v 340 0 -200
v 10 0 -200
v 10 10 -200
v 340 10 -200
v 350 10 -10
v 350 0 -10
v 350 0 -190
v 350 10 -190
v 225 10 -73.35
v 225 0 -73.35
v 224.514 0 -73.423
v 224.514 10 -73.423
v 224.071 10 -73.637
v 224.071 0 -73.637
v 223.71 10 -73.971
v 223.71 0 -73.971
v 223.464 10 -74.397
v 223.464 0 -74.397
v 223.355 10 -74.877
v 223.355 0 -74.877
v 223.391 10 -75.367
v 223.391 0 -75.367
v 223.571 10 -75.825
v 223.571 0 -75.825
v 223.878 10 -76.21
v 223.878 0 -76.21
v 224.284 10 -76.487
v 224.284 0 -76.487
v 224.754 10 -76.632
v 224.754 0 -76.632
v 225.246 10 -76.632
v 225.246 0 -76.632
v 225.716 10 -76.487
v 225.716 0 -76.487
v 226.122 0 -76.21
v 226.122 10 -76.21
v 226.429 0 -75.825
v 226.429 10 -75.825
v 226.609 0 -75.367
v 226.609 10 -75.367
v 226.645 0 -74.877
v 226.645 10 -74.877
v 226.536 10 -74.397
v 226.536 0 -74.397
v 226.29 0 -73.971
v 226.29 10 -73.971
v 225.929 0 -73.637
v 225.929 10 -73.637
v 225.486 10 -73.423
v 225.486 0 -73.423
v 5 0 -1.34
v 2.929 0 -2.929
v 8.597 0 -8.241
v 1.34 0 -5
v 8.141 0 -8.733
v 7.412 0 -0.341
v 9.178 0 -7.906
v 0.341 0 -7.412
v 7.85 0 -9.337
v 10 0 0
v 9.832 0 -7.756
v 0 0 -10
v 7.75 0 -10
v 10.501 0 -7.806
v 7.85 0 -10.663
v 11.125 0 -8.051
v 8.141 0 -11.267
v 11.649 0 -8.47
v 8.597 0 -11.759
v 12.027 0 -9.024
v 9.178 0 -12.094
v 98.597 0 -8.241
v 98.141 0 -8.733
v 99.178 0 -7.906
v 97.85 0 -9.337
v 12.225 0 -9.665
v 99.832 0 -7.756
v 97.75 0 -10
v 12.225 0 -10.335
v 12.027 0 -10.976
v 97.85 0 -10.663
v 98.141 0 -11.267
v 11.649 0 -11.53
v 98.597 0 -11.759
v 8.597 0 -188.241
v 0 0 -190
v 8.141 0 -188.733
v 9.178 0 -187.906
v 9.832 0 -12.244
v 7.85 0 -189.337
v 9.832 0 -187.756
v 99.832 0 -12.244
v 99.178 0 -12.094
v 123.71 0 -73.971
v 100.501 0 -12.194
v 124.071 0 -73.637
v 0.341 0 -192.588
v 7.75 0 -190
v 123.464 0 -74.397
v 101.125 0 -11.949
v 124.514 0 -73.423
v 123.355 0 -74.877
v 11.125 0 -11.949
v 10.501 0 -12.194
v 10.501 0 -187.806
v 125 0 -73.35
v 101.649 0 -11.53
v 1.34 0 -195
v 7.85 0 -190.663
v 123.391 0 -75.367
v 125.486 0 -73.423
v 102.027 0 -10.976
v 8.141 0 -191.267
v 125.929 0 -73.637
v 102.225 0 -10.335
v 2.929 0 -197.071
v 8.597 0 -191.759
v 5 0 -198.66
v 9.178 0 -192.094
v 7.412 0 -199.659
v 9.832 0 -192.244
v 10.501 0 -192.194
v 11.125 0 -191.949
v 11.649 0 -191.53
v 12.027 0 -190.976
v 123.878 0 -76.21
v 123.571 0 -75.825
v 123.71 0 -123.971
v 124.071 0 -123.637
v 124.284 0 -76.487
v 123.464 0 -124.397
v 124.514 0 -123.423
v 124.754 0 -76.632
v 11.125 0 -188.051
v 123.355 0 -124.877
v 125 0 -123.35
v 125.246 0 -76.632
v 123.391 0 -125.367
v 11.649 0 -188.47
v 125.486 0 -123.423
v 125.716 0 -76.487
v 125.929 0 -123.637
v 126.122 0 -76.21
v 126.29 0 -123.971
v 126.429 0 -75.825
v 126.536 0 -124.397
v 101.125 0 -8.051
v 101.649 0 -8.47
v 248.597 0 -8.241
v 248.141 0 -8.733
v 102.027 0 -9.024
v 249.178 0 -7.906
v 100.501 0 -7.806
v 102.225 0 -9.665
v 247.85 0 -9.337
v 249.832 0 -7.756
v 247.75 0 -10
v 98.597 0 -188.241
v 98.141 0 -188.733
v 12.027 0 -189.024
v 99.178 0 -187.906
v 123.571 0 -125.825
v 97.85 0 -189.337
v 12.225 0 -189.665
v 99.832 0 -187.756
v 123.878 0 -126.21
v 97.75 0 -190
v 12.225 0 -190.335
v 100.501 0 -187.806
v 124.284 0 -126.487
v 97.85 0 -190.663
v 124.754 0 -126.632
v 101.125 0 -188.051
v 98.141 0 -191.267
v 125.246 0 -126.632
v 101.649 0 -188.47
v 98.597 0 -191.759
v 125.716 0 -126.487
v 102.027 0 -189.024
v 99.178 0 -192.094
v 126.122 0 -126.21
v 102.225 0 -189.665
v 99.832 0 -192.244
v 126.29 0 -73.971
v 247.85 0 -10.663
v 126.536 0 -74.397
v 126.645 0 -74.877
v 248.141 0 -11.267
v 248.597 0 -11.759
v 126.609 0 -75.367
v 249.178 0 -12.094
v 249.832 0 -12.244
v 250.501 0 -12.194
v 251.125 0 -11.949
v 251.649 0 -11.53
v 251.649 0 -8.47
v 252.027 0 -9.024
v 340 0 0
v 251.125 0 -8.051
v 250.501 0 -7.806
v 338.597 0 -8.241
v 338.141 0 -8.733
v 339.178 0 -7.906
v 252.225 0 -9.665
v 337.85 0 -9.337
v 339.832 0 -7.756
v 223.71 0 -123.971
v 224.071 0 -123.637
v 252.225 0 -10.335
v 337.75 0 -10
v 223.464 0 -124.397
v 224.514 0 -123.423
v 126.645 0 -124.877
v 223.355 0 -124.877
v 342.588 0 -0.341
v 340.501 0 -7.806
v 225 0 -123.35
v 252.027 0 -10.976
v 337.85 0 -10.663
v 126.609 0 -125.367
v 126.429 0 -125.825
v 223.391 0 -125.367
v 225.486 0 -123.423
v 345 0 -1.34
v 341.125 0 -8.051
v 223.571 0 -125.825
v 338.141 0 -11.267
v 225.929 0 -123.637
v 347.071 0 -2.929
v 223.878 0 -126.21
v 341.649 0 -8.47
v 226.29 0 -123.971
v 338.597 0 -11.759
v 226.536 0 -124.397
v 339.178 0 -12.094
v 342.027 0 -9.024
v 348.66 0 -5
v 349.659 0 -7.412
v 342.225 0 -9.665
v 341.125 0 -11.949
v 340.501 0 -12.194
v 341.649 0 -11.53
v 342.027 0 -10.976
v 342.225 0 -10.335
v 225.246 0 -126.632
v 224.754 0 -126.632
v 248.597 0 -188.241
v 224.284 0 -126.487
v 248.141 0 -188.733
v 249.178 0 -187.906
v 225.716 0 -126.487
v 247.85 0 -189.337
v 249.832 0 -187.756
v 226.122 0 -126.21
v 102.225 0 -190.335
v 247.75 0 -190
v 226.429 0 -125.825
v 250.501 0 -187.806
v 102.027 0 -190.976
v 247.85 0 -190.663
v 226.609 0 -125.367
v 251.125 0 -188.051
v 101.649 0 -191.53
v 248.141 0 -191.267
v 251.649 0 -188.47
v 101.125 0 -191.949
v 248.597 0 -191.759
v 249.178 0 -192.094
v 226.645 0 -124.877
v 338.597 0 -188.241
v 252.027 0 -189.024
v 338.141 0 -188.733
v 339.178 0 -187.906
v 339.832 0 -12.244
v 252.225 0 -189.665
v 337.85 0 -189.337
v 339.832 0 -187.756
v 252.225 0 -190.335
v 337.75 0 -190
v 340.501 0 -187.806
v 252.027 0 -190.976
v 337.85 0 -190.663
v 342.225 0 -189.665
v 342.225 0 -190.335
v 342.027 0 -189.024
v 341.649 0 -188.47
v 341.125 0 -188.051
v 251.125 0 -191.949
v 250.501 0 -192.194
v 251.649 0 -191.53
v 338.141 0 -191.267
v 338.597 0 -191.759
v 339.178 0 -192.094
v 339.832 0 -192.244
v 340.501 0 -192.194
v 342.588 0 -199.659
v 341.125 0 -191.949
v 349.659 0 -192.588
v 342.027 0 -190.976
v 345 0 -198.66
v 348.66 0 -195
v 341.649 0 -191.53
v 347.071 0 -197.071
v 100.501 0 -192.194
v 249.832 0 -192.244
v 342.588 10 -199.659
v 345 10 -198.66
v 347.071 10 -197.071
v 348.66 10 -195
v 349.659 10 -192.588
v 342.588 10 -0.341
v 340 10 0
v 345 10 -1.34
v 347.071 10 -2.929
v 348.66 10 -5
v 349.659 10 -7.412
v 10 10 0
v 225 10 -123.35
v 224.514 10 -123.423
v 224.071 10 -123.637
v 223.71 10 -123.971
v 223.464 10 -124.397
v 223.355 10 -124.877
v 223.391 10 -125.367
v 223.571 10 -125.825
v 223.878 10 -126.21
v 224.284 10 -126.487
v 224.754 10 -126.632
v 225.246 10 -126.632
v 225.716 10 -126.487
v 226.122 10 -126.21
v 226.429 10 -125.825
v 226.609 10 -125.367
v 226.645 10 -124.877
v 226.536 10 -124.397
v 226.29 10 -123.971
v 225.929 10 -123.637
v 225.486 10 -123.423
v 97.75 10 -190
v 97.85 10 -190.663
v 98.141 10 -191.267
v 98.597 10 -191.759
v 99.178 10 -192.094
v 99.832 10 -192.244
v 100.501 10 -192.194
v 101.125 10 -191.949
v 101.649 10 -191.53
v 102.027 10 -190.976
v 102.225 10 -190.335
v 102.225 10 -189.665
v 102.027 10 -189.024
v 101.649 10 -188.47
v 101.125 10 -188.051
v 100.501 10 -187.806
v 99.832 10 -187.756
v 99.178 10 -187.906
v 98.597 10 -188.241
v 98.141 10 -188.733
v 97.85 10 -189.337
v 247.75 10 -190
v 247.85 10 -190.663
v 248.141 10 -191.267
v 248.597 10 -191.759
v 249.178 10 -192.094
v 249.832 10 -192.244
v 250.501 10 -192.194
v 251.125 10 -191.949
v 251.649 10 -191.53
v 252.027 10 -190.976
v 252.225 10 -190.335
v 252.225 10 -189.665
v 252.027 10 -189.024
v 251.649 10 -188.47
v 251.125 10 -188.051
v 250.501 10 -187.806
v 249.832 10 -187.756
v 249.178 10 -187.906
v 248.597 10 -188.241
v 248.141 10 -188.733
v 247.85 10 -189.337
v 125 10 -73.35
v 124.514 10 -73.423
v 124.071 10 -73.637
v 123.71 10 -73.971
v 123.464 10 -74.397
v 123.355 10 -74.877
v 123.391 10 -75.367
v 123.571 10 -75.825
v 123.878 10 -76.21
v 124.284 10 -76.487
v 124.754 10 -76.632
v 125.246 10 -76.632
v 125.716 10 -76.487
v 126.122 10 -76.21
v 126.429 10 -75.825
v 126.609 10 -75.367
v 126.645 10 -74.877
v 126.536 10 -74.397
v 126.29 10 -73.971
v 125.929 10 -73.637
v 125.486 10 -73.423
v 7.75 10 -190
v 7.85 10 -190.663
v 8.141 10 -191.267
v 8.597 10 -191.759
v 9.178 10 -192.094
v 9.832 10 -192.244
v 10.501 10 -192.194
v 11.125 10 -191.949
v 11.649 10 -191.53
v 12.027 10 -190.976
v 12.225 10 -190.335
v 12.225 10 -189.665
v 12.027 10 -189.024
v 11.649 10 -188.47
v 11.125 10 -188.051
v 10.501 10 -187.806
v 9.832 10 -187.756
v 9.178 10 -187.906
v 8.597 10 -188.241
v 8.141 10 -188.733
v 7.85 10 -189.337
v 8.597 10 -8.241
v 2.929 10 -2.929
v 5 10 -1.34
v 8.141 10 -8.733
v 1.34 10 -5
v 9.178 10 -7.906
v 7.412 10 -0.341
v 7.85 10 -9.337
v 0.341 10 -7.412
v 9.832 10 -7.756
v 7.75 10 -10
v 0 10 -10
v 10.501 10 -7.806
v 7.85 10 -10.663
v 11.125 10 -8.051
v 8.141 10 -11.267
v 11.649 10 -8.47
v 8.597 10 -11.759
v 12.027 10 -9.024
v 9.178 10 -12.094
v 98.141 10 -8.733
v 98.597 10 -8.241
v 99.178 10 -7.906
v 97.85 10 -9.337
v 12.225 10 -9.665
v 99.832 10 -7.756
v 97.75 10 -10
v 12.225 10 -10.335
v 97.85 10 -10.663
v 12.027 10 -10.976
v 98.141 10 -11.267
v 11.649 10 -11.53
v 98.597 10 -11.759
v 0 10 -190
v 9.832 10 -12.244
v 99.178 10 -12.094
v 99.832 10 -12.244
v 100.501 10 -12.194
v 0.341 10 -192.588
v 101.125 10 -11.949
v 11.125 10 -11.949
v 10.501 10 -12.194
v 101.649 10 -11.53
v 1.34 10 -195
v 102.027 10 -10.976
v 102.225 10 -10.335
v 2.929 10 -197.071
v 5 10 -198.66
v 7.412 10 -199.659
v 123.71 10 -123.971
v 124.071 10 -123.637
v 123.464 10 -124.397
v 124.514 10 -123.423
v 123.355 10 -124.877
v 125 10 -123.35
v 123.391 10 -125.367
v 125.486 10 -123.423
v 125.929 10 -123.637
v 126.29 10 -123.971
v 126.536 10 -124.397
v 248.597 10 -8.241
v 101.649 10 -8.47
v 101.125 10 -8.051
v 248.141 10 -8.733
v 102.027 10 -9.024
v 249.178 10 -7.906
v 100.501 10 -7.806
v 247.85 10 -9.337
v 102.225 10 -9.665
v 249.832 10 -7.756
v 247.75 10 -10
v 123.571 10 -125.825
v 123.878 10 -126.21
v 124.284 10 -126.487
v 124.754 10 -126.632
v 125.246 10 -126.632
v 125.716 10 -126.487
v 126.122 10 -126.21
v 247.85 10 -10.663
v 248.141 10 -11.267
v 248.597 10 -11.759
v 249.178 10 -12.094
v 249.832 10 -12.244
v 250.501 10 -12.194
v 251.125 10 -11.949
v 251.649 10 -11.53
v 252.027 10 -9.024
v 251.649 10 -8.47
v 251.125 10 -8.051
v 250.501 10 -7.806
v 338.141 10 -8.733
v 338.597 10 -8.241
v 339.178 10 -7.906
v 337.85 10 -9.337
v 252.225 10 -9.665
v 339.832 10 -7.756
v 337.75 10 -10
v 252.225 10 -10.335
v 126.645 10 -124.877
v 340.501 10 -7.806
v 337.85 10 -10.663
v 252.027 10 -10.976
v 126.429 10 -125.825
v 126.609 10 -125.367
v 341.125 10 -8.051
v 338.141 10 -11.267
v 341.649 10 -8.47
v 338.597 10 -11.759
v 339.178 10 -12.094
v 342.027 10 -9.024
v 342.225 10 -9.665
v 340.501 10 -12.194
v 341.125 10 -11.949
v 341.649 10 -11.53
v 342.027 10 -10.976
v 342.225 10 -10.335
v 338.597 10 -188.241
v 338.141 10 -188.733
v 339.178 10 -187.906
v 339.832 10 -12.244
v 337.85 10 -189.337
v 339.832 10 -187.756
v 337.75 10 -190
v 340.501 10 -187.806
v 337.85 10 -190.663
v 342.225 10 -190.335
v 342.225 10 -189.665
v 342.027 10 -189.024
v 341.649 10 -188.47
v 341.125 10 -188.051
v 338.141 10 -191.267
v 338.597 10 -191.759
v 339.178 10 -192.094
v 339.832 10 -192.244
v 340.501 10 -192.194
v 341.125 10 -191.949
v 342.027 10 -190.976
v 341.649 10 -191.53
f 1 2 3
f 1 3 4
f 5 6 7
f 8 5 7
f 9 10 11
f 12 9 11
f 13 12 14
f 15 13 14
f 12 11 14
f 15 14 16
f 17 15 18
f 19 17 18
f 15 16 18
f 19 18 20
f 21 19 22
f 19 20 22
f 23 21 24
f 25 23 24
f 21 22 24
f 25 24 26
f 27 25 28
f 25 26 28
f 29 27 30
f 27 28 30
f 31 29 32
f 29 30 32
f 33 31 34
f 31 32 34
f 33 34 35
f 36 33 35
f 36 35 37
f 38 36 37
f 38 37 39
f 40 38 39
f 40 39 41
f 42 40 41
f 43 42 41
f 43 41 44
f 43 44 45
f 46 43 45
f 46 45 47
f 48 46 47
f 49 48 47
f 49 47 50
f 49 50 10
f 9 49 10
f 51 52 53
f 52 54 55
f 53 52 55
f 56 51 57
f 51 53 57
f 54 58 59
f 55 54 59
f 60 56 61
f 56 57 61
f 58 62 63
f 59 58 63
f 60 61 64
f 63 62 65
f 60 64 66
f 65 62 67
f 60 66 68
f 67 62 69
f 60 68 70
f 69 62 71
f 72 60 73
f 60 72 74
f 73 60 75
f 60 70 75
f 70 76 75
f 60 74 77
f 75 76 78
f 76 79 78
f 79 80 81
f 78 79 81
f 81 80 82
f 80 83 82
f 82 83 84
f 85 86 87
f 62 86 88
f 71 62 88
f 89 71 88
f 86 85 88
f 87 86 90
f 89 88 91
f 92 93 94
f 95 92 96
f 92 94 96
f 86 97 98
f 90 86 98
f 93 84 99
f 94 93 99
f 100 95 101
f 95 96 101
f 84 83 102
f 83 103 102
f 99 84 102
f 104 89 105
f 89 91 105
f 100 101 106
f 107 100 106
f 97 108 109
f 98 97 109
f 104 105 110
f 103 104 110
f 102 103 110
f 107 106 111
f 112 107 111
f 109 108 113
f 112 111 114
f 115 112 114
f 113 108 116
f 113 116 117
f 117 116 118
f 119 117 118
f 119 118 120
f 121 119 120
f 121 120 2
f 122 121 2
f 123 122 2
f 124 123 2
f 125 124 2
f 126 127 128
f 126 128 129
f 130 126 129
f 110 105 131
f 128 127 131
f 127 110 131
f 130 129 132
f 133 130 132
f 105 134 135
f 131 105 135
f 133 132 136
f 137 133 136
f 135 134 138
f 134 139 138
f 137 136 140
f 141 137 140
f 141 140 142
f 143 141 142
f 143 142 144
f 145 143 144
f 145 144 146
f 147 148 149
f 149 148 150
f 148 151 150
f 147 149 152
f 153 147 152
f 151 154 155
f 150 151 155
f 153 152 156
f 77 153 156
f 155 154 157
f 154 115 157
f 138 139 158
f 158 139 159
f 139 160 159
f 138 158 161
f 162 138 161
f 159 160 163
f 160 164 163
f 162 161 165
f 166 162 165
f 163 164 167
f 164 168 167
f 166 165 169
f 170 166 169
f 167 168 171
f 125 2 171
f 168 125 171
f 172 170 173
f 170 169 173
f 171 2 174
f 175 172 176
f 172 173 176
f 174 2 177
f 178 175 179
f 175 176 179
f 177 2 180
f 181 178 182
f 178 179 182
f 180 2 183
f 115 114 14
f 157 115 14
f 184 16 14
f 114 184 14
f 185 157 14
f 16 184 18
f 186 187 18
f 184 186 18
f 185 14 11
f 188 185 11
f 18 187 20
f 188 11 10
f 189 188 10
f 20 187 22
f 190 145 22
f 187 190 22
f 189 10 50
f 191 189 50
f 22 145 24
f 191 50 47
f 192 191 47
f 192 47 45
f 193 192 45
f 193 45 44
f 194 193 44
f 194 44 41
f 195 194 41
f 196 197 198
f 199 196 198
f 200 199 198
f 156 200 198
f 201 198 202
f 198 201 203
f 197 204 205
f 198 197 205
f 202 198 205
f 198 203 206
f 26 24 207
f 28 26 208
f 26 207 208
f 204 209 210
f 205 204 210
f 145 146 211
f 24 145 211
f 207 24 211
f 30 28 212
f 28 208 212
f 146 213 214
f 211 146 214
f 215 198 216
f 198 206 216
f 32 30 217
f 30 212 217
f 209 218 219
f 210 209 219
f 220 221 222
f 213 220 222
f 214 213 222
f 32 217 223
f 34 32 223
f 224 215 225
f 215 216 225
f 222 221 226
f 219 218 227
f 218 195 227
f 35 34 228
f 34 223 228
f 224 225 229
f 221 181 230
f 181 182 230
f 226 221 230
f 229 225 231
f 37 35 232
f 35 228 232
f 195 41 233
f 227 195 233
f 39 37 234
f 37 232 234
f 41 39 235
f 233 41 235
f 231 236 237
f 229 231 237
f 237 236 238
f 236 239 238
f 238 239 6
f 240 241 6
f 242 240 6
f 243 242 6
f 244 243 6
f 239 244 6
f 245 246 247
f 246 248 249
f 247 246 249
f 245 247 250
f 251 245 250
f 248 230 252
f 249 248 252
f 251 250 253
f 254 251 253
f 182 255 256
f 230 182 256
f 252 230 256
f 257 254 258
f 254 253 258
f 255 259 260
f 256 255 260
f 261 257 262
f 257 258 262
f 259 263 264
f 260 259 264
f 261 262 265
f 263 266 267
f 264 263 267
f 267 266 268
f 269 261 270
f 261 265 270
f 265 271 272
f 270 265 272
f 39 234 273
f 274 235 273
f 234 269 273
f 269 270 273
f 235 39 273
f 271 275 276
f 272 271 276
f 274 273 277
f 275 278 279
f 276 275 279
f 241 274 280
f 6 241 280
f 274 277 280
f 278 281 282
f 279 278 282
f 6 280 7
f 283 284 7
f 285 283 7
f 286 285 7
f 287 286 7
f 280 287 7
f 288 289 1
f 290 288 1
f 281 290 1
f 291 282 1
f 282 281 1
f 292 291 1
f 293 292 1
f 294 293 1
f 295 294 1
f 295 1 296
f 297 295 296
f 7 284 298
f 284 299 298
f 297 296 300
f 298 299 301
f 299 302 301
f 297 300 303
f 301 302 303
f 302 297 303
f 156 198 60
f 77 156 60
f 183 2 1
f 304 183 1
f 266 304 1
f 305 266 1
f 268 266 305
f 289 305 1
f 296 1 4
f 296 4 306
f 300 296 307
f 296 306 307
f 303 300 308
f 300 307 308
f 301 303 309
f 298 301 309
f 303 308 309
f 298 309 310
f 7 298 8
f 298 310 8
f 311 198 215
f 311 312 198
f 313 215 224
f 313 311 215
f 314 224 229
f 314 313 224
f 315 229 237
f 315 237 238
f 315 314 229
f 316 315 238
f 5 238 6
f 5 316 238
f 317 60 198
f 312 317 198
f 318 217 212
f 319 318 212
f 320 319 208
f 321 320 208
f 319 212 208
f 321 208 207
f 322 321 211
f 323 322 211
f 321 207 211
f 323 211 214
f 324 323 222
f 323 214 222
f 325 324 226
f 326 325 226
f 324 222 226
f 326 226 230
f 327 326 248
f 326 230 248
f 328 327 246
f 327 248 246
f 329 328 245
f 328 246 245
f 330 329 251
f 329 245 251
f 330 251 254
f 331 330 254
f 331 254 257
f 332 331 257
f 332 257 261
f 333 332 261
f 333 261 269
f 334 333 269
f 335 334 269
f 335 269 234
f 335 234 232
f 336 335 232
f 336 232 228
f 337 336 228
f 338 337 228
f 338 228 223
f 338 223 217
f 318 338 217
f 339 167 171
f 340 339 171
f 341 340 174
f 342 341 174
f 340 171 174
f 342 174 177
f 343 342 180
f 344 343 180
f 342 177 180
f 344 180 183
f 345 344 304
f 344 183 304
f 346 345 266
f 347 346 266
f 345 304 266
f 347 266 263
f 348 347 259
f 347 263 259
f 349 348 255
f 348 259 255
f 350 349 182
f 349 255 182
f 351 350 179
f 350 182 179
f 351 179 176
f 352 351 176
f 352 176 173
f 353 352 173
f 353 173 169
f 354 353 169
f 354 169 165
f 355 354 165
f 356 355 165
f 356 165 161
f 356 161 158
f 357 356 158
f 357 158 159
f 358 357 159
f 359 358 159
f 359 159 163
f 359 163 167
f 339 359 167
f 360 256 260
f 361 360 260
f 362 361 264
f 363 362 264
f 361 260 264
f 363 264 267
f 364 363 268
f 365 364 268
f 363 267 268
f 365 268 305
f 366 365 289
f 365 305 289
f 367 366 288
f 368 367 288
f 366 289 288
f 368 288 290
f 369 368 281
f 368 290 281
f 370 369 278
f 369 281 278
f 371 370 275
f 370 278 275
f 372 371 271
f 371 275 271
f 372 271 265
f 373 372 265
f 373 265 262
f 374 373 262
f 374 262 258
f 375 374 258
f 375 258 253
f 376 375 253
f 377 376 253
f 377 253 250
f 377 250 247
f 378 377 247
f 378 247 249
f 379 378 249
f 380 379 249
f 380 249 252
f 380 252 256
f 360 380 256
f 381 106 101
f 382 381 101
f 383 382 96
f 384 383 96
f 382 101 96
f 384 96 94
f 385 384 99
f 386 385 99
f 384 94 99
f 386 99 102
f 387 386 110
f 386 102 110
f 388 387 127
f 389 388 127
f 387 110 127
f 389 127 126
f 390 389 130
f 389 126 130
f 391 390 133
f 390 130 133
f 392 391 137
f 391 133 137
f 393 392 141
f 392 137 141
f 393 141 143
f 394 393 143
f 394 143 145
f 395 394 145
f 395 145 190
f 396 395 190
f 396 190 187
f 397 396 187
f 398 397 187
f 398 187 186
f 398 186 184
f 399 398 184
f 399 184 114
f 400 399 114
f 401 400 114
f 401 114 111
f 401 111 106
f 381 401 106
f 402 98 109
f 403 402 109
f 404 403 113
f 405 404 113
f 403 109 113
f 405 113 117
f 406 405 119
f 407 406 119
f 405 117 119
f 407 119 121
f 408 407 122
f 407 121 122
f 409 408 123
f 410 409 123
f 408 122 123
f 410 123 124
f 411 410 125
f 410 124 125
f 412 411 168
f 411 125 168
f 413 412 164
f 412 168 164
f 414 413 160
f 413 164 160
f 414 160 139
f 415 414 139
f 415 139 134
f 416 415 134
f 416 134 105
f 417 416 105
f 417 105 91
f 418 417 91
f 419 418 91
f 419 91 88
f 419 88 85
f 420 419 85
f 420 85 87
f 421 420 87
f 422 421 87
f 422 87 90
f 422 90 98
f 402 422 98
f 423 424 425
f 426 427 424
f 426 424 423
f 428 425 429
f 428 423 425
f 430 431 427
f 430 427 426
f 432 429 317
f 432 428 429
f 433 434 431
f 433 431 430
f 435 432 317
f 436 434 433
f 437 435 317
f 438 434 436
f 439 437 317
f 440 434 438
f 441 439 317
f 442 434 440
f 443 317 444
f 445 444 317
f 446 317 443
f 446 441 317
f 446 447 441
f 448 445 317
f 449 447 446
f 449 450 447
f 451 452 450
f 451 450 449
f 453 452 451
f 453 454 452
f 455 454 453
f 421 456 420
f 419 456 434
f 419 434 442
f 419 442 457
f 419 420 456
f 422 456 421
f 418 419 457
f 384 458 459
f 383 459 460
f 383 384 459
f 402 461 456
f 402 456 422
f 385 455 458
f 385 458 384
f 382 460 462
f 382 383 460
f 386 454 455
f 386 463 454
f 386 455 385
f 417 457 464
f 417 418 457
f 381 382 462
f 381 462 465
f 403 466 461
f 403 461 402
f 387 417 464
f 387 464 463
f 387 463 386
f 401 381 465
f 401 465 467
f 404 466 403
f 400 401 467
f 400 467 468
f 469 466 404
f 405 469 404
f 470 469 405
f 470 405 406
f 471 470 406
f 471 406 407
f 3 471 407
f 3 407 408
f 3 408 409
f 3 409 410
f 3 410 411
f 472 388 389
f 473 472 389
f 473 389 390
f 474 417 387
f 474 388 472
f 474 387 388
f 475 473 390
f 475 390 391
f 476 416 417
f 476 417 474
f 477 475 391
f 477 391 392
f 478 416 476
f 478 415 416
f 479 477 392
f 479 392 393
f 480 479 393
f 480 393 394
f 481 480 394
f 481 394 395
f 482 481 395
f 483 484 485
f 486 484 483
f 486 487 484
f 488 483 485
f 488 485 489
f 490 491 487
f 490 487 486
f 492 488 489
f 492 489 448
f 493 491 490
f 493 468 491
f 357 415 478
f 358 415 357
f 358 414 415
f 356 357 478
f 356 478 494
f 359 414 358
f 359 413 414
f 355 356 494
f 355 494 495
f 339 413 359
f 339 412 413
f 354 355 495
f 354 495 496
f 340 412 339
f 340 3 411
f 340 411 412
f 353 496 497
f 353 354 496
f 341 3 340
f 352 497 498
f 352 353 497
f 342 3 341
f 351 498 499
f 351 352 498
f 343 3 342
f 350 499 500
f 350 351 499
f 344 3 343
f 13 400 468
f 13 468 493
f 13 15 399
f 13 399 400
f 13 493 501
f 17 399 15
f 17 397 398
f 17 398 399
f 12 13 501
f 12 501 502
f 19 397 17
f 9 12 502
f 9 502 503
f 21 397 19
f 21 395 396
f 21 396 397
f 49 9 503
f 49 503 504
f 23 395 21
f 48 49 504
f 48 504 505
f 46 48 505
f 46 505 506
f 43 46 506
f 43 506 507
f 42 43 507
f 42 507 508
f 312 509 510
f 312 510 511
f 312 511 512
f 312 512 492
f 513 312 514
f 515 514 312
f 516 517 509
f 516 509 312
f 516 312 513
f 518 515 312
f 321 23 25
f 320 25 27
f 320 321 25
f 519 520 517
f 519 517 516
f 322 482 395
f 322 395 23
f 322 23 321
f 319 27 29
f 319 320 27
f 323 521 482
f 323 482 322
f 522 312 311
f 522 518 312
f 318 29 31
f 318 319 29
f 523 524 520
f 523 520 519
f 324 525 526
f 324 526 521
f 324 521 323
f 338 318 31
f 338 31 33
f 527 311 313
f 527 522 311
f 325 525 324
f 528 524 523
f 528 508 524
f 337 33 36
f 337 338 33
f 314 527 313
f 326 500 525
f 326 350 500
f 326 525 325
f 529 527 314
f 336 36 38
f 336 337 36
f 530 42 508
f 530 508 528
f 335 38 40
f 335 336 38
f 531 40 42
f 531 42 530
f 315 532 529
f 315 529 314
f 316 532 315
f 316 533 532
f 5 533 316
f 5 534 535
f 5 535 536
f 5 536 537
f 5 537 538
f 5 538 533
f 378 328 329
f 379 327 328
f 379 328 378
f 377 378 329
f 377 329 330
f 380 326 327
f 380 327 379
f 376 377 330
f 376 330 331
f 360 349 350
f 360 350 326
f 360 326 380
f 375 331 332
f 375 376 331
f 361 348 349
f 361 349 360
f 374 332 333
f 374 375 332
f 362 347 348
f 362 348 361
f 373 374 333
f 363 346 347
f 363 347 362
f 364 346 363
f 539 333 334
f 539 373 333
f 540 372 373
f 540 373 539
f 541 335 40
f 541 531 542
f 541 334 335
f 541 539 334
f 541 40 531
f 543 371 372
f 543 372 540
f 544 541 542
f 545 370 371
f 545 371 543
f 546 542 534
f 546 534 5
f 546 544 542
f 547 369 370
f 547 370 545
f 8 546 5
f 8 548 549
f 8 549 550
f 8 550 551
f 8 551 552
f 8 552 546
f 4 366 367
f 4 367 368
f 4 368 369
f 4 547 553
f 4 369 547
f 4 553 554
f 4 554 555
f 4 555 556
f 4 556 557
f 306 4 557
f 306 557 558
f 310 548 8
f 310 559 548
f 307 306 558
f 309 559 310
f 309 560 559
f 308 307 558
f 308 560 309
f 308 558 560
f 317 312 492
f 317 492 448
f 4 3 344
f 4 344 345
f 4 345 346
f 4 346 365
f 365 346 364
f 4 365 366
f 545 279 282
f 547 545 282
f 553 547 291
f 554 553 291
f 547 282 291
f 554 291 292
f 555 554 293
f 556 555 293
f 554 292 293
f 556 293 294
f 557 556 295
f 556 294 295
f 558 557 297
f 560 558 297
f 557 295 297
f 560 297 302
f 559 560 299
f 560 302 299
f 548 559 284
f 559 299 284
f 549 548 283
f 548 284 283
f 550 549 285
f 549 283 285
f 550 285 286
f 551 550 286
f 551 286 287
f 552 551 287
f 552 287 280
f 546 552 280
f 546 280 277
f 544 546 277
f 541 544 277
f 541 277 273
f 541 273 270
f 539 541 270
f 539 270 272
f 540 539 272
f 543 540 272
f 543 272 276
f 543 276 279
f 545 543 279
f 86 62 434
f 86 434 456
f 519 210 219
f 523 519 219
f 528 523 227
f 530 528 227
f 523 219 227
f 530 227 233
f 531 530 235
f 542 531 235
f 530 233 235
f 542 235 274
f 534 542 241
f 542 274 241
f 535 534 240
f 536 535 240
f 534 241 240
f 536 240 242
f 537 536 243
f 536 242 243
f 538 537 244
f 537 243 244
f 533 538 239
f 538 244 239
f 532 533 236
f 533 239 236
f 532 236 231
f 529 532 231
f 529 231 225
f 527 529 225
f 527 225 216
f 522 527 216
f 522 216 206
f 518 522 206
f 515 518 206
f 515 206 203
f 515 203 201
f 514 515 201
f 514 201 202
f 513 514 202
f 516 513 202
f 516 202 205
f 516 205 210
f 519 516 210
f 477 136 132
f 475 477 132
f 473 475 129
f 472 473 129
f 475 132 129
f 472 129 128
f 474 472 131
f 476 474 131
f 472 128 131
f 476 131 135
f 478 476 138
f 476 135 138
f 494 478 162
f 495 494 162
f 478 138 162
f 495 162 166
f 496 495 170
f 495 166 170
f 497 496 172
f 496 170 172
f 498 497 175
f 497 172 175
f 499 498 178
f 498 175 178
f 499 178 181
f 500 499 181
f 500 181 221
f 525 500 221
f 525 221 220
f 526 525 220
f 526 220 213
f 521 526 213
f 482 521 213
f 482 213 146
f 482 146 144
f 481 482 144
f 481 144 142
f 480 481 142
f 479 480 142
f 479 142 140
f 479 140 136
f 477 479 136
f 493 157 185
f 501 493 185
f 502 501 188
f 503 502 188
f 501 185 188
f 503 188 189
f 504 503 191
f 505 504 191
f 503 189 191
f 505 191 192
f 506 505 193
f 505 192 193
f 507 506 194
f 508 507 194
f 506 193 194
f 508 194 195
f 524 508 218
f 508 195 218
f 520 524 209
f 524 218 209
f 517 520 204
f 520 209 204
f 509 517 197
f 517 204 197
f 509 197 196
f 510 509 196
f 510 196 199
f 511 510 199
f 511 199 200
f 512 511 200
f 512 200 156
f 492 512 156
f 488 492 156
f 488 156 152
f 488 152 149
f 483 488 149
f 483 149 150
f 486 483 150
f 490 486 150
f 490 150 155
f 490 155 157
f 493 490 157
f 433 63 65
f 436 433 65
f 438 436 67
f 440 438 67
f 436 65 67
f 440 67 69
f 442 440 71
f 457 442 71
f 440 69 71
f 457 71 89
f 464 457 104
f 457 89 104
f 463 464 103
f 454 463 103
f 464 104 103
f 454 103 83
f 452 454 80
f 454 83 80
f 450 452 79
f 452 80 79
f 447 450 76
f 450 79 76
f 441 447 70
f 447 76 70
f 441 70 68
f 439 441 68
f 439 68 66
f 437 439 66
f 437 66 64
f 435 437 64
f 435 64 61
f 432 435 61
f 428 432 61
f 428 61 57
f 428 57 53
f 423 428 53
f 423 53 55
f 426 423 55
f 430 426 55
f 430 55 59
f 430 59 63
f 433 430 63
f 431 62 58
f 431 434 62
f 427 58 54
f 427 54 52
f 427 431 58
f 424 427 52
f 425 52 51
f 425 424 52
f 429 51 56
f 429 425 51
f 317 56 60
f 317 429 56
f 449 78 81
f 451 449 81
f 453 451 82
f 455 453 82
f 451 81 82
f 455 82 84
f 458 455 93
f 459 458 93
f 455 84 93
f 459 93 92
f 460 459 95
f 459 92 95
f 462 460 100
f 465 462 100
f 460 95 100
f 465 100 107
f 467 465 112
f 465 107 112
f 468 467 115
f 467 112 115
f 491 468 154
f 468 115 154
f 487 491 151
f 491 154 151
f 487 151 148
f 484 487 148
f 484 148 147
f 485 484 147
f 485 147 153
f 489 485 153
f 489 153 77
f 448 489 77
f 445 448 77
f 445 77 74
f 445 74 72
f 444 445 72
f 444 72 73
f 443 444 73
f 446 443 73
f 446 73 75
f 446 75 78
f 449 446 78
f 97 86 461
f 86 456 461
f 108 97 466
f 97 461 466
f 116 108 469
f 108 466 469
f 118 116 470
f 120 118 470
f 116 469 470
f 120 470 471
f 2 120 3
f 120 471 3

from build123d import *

# Parameters (mm, degrees)
SKETCH_1_W        = 350
SKETCH_1_H        = 200
EXTRUDE_1_DEPTH   = 10
M4X0_7_D          = 3.3
HOLE_WIZARD_M42_D = 4.5
FILLET_1_R        = 10


with BuildPart() as part:
    # Эскиз1 → Бобышка-Вытянуть1 (new body)
    with BuildSketch(Plane(origin=(0, 0, 0), x_dir=(1, 0, 0), z_dir=(0, 1, 0))):
        with Locations((175, 100)):
            Rectangle(SKETCH_1_W, SKETCH_1_H)
    extrude(amount=EXTRUDE_1_DEPTH)

    # Отверстие обработанное метчиком M4x0.7 (through all)
    with Locations(Plane(origin=(134.244811271, 10, -121.125670736), x_dir=(0, 0, -1), z_dir=(0, 1, 0))):
        with Locations((-46.125670736, 9.244811271), (3.874329264, 9.244811271), (3.874329264, -90.755188729), (-46.125670736, -90.755188729)):
            Hole(M4X0_7_D / 2)

    # Отверстие с зазором M42 (through all)
    with Locations(Plane(origin=(0, 10, 0), x_dir=(1, 0, 0), z_dir=(0, 1, 0))):
        with Locations((10, 10), (100, 10), (100, 190), (10, 190), (250, 190), (340, 190), (340, 10), (250, 10)):
            Hole(HOLE_WIZARD_M42_D / 2)

    # Скругление1
    fillet_1_edges = [part.edges().sort_by_distance(p)[0] for p in [
        (0, 5, -200),
        (350, 5, -200),
        (350, 5, 0),
        (0, 5, 0),
    ]]
    fillet(fillet_1_edges, radius=FILLET_1_R)


solid = part.part
